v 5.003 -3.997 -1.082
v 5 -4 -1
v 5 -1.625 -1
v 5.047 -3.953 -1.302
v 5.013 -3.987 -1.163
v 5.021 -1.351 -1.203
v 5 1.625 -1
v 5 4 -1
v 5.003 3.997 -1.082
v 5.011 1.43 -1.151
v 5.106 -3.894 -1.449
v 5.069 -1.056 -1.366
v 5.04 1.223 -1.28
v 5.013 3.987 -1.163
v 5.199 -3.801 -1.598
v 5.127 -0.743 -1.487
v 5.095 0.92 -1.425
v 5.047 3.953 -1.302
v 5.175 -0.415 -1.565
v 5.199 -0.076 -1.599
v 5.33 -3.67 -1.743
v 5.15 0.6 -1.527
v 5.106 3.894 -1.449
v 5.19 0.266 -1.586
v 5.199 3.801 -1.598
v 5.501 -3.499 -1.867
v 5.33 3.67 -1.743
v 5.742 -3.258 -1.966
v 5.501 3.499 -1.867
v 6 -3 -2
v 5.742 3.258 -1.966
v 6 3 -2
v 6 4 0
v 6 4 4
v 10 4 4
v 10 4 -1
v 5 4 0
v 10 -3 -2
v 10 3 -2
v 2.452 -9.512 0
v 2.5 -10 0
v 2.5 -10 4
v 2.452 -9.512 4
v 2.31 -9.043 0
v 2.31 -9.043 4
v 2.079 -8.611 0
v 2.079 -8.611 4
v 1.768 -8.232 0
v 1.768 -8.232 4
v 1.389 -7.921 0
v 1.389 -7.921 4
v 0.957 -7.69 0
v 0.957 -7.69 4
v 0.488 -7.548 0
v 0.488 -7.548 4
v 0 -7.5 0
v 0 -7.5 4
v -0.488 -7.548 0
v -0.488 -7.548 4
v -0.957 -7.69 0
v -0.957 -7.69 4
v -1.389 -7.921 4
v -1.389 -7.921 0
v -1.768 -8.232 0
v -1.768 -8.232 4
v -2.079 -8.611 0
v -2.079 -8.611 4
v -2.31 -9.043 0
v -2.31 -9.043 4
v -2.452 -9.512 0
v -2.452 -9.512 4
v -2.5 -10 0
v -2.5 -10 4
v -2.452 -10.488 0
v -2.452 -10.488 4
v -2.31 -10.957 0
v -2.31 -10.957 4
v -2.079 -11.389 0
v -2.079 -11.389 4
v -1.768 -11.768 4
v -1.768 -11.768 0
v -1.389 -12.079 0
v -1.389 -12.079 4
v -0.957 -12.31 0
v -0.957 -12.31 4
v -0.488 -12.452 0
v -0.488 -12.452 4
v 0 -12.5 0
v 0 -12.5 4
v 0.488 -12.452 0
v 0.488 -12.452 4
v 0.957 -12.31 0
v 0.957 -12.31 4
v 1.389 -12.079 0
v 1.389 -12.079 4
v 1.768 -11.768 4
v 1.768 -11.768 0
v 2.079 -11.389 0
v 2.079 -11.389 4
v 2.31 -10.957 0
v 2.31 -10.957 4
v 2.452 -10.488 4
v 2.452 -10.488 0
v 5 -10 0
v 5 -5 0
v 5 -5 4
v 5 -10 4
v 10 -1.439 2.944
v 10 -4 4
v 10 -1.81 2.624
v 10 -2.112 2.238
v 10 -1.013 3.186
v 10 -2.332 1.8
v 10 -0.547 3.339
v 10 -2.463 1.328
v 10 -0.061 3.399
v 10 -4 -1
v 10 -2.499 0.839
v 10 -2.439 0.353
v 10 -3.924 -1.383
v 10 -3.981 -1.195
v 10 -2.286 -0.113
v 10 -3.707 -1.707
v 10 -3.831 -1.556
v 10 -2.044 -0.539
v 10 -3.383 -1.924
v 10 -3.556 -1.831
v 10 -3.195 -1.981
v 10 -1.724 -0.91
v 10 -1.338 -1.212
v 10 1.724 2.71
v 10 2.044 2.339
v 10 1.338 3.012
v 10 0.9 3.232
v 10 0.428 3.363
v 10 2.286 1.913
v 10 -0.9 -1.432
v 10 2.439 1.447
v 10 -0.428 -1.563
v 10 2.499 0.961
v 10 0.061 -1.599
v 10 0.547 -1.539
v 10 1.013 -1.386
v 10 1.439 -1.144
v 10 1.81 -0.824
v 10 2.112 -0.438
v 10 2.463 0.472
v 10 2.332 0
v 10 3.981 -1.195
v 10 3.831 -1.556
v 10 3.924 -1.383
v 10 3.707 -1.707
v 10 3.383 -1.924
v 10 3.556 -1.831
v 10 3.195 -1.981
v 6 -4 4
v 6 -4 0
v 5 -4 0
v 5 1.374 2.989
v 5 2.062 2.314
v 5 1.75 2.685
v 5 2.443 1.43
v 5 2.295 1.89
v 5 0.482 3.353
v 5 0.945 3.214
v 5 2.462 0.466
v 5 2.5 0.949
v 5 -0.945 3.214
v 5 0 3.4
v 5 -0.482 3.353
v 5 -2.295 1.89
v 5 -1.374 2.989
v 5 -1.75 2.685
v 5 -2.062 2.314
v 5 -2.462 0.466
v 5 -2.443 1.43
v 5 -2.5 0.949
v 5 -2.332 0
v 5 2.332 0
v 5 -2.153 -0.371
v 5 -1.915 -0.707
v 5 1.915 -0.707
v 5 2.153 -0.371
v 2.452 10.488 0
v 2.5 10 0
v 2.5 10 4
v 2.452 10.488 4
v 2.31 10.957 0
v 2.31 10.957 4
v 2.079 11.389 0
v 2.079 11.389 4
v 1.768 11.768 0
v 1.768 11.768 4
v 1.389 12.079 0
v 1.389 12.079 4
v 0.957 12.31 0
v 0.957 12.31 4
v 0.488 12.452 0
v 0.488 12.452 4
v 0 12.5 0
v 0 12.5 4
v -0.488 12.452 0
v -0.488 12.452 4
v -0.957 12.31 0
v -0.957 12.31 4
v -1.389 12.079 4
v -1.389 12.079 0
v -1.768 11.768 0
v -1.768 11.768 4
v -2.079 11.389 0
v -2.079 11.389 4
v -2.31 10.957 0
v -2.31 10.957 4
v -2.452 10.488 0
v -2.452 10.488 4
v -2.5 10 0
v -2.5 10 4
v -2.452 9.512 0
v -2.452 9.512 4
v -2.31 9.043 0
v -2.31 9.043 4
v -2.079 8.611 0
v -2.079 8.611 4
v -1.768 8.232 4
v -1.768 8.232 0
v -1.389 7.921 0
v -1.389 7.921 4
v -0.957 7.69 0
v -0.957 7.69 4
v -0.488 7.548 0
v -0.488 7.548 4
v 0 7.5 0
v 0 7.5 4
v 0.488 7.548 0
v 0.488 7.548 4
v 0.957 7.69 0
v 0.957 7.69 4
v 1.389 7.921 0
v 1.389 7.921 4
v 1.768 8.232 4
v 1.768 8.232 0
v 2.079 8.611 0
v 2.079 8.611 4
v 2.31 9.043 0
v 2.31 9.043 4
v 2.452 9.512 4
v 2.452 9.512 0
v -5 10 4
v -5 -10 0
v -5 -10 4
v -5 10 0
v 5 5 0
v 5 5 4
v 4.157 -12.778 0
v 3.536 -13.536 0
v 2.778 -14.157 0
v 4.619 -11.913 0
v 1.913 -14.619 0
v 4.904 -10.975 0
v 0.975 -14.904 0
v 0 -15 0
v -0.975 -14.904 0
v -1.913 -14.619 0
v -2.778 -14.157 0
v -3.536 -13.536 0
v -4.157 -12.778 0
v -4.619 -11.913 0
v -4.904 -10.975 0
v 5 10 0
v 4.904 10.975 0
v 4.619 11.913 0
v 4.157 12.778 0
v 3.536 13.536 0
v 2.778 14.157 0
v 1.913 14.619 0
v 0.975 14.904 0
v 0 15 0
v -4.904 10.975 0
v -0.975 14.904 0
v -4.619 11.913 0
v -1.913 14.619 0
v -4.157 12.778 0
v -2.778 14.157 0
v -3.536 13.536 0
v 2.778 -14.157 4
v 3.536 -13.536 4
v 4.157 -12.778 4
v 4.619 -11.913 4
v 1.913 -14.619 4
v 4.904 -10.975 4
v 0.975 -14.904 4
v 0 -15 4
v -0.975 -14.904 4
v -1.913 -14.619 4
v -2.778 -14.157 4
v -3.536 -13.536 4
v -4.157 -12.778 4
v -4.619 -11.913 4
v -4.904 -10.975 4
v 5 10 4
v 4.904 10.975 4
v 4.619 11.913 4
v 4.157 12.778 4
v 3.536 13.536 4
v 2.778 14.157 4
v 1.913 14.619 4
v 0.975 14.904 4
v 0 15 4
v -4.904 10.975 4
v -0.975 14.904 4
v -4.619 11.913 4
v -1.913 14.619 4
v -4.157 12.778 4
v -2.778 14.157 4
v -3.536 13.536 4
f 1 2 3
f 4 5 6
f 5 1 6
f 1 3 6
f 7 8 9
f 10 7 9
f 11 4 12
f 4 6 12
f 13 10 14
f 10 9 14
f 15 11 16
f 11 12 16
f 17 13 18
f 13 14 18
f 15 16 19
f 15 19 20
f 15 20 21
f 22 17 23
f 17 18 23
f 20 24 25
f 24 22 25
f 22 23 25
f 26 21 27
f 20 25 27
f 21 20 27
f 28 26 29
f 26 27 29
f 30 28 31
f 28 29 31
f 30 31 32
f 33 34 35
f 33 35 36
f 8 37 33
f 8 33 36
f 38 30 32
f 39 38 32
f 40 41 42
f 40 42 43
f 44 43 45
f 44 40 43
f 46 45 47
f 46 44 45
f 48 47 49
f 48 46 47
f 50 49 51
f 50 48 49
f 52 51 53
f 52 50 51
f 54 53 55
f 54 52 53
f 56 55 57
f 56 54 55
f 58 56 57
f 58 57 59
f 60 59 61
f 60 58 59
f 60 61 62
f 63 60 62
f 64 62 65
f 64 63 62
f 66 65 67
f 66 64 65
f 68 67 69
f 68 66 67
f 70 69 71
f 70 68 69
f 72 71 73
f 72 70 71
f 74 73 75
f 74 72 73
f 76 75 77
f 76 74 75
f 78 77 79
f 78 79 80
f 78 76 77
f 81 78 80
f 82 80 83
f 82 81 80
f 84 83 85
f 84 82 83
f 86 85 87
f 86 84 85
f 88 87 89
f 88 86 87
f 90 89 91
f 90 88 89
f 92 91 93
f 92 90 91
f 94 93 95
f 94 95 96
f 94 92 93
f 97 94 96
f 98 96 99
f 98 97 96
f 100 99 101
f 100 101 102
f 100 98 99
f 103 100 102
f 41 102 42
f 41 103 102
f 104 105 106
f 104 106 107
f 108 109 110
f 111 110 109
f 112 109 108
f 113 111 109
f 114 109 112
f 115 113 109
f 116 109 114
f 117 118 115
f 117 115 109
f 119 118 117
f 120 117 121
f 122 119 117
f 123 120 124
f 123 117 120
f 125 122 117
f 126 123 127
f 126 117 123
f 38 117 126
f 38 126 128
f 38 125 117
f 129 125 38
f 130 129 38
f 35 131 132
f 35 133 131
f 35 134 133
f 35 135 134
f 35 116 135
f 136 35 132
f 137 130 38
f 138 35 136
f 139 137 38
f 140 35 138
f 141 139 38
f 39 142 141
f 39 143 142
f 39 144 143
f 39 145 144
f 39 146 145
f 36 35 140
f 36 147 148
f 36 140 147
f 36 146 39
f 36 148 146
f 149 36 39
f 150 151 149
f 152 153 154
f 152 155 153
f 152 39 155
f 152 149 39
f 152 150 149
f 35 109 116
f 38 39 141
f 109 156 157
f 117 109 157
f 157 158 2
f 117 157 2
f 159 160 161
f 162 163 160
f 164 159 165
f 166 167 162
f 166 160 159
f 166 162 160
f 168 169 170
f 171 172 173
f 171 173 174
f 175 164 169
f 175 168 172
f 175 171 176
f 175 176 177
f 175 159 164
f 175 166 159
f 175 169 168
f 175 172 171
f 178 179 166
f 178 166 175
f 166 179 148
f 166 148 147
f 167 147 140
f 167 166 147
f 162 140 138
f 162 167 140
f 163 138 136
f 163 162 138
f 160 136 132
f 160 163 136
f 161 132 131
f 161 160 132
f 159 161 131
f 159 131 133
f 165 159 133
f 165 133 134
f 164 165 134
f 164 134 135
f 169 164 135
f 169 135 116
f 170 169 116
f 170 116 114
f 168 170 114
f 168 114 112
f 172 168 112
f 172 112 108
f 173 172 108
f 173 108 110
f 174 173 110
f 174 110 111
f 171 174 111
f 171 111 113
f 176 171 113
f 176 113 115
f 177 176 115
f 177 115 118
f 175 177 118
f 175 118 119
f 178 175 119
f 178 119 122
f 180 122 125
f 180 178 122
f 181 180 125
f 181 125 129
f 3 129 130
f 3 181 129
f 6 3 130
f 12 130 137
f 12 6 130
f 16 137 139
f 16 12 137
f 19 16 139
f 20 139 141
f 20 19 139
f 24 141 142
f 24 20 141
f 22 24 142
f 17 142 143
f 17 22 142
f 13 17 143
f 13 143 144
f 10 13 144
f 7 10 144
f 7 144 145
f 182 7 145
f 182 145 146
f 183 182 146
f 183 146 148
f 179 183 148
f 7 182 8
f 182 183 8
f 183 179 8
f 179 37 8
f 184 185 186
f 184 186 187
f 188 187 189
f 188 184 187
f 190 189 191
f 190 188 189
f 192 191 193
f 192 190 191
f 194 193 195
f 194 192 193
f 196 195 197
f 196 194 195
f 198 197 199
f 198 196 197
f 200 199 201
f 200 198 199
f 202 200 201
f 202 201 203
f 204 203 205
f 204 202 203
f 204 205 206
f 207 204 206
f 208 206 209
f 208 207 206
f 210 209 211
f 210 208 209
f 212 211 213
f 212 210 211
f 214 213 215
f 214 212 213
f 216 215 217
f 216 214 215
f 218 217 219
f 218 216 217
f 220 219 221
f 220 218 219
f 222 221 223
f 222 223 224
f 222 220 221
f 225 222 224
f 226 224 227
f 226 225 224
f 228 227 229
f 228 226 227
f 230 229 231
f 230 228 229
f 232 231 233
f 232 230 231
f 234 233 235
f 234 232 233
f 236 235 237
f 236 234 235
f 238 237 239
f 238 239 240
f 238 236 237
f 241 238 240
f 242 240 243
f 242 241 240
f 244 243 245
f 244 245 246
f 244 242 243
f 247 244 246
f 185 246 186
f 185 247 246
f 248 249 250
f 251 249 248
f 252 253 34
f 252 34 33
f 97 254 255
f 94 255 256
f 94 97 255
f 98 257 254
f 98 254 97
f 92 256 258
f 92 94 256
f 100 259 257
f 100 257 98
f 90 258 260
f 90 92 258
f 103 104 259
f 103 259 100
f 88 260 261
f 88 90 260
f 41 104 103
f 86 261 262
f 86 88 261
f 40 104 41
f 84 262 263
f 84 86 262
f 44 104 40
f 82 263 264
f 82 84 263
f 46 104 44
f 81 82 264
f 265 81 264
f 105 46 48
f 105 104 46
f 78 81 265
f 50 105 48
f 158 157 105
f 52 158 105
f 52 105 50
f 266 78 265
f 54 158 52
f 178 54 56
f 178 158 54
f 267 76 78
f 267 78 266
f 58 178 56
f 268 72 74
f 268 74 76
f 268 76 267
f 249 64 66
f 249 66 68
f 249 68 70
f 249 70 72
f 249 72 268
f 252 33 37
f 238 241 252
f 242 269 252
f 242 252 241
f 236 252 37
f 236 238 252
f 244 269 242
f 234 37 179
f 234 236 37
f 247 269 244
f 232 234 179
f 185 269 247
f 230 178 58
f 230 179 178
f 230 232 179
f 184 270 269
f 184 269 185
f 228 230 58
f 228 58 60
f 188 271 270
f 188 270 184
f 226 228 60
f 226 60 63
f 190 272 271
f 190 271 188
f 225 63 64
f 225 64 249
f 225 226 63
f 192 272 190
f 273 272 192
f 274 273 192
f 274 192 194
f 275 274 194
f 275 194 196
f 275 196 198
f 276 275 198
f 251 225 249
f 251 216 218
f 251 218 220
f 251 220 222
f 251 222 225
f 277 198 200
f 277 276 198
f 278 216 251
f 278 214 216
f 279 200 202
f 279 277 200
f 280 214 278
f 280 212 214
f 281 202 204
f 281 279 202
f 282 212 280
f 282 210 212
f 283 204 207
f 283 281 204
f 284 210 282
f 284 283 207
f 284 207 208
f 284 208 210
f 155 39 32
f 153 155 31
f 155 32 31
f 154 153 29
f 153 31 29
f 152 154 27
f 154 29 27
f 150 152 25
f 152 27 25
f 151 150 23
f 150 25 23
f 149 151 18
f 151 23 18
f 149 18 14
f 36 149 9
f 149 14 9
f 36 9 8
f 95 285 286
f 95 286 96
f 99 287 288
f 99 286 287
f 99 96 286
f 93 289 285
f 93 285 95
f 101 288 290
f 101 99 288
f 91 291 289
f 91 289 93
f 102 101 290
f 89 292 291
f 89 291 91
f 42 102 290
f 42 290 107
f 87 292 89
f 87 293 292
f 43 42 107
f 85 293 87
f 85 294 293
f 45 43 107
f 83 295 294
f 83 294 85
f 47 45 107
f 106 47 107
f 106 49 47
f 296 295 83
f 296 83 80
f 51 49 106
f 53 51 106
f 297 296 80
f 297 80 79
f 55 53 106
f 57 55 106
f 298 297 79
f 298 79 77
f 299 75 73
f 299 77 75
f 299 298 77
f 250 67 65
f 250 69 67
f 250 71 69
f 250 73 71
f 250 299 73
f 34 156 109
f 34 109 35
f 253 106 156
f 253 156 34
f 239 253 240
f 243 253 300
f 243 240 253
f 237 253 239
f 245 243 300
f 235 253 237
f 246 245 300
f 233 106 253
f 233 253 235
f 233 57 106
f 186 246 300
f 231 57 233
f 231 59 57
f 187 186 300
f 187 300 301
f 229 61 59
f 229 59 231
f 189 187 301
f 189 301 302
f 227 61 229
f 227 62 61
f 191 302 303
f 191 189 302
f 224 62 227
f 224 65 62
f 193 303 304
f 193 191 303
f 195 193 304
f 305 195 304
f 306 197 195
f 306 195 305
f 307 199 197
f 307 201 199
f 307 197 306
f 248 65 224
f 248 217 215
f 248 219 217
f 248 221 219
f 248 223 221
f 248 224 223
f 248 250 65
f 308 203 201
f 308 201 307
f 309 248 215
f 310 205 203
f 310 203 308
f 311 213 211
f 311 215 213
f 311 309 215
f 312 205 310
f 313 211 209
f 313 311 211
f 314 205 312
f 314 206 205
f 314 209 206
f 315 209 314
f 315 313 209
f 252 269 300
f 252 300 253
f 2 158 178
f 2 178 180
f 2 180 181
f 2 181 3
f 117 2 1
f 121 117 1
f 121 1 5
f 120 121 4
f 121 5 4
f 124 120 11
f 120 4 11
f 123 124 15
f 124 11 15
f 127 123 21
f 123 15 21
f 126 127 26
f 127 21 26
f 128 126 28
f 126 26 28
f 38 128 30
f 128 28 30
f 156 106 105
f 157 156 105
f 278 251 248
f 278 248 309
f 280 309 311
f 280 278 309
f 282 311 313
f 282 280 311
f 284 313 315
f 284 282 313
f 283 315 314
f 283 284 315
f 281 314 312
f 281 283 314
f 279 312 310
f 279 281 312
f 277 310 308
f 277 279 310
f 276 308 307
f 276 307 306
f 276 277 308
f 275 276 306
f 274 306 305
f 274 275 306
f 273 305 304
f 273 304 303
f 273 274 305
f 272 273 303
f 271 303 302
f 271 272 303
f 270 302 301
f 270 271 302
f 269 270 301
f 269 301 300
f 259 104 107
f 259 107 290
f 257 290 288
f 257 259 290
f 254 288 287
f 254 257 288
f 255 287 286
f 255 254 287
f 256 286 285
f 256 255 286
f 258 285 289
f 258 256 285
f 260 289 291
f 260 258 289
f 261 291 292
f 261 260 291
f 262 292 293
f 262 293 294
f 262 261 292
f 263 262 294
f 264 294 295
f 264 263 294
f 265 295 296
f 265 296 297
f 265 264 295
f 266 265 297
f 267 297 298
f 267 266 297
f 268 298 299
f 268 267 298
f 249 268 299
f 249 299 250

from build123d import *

# Parameters (mm, degrees)
SKETCH_1_R      = 2.5
EXTRUDE_1_DEPTH = 4
SKETCH_2_W      = 6
SKETCH_2_H      = 8
SKETCH_2_R      = 2.5
EXTRUDE_2_DEPTH = 5
CHAMFER_1_SIZE  = 1
FILLET_1_R      = 1


with BuildPart() as part:
    # 草图1 → 凸台-拉伸1 (new body)
    with BuildSketch(Plane.XY):
        with BuildLine():
            Line((5, 10), (5, -10))
            ThreePointArc((5, -10), (0, -15), (-5, -10))
            Line((-5, -10), (-5, 10))
            ThreePointArc((-5, 10), (0, 15), (5, 10))
        make_face()
        with Locations((0, 10)):
            Circle(SKETCH_1_R, mode=Mode.SUBTRACT)
        with Locations((0, -10)):
            Circle(SKETCH_1_R, mode=Mode.SUBTRACT)
    extrude(amount=EXTRUDE_1_DEPTH)

    # 草图2 → 凸台-拉伸2 (add)
    with BuildSketch(Plane(origin=(5, 0, 0), x_dir=(0, 0, -1), z_dir=(1, 0, 0))):
        with Locations((-1, 0)):
            Rectangle(SKETCH_2_W, SKETCH_2_H)
        with Locations(Location((-0.9, 0, 0), (0, 0, 68.899803976))):
            Circle(SKETCH_2_R, mode=Mode.SUBTRACT)
    extrude(amount=EXTRUDE_2_DEPTH)

    # 倒角1
    chamfer_1_edges = [part.edges().sort_by_distance(p)[0] for p in [
        (5, -4, 2),
        (5, 4, 2),
    ]]
    chamfer(chamfer_1_edges, length=CHAMFER_1_SIZE)

    # 圆角1
    # the kernel refuses this fillet: 1 mm, written as the material it takes off along each edge
    with BuildSketch(Plane(origin=(5, 6.5, -2), x_dir=(0, 0, 1), z_dir=(0, -1, 0))) as fillet_1_piece_1:
        with BuildLine():
            CenterArc((FILLET_1_R, -FILLET_1_R), FILLET_1_R, 90, 90)
            Line((0, -FILLET_1_R), (0, 0))
            Line((0, 0), (FILLET_1_R, 0))
        make_face()
    extrude(amount=13, mode=Mode.SUBTRACT)
    with BuildSketch(Plane(origin=(2.5, -4, -2), x_dir=(0, 0, 1), z_dir=(1, 0, 0))) as fillet_1_piece_2:
        with BuildLine():
            CenterArc((FILLET_1_R, -FILLET_1_R), FILLET_1_R, 90, 90)
            Line((0, -FILLET_1_R), (0, 0))
            Line((0, 0), (FILLET_1_R, 0))
        make_face()
    extrude(amount=10, mode=Mode.SUBTRACT)
    with BuildSketch(Plane(origin=(2.5, 4, -2), x_dir=(0, 0, 1), z_dir=(1, 0, 0))) as fillet_1_piece_3:
        with BuildLine():
            CenterArc((FILLET_1_R, FILLET_1_R), FILLET_1_R, 180, 90)
            Line((0, FILLET_1_R), (0, 0))
            Line((0, 0), (FILLET_1_R, 0))
        make_face()
    extrude(amount=10, mode=Mode.SUBTRACT)


solid = part.part
